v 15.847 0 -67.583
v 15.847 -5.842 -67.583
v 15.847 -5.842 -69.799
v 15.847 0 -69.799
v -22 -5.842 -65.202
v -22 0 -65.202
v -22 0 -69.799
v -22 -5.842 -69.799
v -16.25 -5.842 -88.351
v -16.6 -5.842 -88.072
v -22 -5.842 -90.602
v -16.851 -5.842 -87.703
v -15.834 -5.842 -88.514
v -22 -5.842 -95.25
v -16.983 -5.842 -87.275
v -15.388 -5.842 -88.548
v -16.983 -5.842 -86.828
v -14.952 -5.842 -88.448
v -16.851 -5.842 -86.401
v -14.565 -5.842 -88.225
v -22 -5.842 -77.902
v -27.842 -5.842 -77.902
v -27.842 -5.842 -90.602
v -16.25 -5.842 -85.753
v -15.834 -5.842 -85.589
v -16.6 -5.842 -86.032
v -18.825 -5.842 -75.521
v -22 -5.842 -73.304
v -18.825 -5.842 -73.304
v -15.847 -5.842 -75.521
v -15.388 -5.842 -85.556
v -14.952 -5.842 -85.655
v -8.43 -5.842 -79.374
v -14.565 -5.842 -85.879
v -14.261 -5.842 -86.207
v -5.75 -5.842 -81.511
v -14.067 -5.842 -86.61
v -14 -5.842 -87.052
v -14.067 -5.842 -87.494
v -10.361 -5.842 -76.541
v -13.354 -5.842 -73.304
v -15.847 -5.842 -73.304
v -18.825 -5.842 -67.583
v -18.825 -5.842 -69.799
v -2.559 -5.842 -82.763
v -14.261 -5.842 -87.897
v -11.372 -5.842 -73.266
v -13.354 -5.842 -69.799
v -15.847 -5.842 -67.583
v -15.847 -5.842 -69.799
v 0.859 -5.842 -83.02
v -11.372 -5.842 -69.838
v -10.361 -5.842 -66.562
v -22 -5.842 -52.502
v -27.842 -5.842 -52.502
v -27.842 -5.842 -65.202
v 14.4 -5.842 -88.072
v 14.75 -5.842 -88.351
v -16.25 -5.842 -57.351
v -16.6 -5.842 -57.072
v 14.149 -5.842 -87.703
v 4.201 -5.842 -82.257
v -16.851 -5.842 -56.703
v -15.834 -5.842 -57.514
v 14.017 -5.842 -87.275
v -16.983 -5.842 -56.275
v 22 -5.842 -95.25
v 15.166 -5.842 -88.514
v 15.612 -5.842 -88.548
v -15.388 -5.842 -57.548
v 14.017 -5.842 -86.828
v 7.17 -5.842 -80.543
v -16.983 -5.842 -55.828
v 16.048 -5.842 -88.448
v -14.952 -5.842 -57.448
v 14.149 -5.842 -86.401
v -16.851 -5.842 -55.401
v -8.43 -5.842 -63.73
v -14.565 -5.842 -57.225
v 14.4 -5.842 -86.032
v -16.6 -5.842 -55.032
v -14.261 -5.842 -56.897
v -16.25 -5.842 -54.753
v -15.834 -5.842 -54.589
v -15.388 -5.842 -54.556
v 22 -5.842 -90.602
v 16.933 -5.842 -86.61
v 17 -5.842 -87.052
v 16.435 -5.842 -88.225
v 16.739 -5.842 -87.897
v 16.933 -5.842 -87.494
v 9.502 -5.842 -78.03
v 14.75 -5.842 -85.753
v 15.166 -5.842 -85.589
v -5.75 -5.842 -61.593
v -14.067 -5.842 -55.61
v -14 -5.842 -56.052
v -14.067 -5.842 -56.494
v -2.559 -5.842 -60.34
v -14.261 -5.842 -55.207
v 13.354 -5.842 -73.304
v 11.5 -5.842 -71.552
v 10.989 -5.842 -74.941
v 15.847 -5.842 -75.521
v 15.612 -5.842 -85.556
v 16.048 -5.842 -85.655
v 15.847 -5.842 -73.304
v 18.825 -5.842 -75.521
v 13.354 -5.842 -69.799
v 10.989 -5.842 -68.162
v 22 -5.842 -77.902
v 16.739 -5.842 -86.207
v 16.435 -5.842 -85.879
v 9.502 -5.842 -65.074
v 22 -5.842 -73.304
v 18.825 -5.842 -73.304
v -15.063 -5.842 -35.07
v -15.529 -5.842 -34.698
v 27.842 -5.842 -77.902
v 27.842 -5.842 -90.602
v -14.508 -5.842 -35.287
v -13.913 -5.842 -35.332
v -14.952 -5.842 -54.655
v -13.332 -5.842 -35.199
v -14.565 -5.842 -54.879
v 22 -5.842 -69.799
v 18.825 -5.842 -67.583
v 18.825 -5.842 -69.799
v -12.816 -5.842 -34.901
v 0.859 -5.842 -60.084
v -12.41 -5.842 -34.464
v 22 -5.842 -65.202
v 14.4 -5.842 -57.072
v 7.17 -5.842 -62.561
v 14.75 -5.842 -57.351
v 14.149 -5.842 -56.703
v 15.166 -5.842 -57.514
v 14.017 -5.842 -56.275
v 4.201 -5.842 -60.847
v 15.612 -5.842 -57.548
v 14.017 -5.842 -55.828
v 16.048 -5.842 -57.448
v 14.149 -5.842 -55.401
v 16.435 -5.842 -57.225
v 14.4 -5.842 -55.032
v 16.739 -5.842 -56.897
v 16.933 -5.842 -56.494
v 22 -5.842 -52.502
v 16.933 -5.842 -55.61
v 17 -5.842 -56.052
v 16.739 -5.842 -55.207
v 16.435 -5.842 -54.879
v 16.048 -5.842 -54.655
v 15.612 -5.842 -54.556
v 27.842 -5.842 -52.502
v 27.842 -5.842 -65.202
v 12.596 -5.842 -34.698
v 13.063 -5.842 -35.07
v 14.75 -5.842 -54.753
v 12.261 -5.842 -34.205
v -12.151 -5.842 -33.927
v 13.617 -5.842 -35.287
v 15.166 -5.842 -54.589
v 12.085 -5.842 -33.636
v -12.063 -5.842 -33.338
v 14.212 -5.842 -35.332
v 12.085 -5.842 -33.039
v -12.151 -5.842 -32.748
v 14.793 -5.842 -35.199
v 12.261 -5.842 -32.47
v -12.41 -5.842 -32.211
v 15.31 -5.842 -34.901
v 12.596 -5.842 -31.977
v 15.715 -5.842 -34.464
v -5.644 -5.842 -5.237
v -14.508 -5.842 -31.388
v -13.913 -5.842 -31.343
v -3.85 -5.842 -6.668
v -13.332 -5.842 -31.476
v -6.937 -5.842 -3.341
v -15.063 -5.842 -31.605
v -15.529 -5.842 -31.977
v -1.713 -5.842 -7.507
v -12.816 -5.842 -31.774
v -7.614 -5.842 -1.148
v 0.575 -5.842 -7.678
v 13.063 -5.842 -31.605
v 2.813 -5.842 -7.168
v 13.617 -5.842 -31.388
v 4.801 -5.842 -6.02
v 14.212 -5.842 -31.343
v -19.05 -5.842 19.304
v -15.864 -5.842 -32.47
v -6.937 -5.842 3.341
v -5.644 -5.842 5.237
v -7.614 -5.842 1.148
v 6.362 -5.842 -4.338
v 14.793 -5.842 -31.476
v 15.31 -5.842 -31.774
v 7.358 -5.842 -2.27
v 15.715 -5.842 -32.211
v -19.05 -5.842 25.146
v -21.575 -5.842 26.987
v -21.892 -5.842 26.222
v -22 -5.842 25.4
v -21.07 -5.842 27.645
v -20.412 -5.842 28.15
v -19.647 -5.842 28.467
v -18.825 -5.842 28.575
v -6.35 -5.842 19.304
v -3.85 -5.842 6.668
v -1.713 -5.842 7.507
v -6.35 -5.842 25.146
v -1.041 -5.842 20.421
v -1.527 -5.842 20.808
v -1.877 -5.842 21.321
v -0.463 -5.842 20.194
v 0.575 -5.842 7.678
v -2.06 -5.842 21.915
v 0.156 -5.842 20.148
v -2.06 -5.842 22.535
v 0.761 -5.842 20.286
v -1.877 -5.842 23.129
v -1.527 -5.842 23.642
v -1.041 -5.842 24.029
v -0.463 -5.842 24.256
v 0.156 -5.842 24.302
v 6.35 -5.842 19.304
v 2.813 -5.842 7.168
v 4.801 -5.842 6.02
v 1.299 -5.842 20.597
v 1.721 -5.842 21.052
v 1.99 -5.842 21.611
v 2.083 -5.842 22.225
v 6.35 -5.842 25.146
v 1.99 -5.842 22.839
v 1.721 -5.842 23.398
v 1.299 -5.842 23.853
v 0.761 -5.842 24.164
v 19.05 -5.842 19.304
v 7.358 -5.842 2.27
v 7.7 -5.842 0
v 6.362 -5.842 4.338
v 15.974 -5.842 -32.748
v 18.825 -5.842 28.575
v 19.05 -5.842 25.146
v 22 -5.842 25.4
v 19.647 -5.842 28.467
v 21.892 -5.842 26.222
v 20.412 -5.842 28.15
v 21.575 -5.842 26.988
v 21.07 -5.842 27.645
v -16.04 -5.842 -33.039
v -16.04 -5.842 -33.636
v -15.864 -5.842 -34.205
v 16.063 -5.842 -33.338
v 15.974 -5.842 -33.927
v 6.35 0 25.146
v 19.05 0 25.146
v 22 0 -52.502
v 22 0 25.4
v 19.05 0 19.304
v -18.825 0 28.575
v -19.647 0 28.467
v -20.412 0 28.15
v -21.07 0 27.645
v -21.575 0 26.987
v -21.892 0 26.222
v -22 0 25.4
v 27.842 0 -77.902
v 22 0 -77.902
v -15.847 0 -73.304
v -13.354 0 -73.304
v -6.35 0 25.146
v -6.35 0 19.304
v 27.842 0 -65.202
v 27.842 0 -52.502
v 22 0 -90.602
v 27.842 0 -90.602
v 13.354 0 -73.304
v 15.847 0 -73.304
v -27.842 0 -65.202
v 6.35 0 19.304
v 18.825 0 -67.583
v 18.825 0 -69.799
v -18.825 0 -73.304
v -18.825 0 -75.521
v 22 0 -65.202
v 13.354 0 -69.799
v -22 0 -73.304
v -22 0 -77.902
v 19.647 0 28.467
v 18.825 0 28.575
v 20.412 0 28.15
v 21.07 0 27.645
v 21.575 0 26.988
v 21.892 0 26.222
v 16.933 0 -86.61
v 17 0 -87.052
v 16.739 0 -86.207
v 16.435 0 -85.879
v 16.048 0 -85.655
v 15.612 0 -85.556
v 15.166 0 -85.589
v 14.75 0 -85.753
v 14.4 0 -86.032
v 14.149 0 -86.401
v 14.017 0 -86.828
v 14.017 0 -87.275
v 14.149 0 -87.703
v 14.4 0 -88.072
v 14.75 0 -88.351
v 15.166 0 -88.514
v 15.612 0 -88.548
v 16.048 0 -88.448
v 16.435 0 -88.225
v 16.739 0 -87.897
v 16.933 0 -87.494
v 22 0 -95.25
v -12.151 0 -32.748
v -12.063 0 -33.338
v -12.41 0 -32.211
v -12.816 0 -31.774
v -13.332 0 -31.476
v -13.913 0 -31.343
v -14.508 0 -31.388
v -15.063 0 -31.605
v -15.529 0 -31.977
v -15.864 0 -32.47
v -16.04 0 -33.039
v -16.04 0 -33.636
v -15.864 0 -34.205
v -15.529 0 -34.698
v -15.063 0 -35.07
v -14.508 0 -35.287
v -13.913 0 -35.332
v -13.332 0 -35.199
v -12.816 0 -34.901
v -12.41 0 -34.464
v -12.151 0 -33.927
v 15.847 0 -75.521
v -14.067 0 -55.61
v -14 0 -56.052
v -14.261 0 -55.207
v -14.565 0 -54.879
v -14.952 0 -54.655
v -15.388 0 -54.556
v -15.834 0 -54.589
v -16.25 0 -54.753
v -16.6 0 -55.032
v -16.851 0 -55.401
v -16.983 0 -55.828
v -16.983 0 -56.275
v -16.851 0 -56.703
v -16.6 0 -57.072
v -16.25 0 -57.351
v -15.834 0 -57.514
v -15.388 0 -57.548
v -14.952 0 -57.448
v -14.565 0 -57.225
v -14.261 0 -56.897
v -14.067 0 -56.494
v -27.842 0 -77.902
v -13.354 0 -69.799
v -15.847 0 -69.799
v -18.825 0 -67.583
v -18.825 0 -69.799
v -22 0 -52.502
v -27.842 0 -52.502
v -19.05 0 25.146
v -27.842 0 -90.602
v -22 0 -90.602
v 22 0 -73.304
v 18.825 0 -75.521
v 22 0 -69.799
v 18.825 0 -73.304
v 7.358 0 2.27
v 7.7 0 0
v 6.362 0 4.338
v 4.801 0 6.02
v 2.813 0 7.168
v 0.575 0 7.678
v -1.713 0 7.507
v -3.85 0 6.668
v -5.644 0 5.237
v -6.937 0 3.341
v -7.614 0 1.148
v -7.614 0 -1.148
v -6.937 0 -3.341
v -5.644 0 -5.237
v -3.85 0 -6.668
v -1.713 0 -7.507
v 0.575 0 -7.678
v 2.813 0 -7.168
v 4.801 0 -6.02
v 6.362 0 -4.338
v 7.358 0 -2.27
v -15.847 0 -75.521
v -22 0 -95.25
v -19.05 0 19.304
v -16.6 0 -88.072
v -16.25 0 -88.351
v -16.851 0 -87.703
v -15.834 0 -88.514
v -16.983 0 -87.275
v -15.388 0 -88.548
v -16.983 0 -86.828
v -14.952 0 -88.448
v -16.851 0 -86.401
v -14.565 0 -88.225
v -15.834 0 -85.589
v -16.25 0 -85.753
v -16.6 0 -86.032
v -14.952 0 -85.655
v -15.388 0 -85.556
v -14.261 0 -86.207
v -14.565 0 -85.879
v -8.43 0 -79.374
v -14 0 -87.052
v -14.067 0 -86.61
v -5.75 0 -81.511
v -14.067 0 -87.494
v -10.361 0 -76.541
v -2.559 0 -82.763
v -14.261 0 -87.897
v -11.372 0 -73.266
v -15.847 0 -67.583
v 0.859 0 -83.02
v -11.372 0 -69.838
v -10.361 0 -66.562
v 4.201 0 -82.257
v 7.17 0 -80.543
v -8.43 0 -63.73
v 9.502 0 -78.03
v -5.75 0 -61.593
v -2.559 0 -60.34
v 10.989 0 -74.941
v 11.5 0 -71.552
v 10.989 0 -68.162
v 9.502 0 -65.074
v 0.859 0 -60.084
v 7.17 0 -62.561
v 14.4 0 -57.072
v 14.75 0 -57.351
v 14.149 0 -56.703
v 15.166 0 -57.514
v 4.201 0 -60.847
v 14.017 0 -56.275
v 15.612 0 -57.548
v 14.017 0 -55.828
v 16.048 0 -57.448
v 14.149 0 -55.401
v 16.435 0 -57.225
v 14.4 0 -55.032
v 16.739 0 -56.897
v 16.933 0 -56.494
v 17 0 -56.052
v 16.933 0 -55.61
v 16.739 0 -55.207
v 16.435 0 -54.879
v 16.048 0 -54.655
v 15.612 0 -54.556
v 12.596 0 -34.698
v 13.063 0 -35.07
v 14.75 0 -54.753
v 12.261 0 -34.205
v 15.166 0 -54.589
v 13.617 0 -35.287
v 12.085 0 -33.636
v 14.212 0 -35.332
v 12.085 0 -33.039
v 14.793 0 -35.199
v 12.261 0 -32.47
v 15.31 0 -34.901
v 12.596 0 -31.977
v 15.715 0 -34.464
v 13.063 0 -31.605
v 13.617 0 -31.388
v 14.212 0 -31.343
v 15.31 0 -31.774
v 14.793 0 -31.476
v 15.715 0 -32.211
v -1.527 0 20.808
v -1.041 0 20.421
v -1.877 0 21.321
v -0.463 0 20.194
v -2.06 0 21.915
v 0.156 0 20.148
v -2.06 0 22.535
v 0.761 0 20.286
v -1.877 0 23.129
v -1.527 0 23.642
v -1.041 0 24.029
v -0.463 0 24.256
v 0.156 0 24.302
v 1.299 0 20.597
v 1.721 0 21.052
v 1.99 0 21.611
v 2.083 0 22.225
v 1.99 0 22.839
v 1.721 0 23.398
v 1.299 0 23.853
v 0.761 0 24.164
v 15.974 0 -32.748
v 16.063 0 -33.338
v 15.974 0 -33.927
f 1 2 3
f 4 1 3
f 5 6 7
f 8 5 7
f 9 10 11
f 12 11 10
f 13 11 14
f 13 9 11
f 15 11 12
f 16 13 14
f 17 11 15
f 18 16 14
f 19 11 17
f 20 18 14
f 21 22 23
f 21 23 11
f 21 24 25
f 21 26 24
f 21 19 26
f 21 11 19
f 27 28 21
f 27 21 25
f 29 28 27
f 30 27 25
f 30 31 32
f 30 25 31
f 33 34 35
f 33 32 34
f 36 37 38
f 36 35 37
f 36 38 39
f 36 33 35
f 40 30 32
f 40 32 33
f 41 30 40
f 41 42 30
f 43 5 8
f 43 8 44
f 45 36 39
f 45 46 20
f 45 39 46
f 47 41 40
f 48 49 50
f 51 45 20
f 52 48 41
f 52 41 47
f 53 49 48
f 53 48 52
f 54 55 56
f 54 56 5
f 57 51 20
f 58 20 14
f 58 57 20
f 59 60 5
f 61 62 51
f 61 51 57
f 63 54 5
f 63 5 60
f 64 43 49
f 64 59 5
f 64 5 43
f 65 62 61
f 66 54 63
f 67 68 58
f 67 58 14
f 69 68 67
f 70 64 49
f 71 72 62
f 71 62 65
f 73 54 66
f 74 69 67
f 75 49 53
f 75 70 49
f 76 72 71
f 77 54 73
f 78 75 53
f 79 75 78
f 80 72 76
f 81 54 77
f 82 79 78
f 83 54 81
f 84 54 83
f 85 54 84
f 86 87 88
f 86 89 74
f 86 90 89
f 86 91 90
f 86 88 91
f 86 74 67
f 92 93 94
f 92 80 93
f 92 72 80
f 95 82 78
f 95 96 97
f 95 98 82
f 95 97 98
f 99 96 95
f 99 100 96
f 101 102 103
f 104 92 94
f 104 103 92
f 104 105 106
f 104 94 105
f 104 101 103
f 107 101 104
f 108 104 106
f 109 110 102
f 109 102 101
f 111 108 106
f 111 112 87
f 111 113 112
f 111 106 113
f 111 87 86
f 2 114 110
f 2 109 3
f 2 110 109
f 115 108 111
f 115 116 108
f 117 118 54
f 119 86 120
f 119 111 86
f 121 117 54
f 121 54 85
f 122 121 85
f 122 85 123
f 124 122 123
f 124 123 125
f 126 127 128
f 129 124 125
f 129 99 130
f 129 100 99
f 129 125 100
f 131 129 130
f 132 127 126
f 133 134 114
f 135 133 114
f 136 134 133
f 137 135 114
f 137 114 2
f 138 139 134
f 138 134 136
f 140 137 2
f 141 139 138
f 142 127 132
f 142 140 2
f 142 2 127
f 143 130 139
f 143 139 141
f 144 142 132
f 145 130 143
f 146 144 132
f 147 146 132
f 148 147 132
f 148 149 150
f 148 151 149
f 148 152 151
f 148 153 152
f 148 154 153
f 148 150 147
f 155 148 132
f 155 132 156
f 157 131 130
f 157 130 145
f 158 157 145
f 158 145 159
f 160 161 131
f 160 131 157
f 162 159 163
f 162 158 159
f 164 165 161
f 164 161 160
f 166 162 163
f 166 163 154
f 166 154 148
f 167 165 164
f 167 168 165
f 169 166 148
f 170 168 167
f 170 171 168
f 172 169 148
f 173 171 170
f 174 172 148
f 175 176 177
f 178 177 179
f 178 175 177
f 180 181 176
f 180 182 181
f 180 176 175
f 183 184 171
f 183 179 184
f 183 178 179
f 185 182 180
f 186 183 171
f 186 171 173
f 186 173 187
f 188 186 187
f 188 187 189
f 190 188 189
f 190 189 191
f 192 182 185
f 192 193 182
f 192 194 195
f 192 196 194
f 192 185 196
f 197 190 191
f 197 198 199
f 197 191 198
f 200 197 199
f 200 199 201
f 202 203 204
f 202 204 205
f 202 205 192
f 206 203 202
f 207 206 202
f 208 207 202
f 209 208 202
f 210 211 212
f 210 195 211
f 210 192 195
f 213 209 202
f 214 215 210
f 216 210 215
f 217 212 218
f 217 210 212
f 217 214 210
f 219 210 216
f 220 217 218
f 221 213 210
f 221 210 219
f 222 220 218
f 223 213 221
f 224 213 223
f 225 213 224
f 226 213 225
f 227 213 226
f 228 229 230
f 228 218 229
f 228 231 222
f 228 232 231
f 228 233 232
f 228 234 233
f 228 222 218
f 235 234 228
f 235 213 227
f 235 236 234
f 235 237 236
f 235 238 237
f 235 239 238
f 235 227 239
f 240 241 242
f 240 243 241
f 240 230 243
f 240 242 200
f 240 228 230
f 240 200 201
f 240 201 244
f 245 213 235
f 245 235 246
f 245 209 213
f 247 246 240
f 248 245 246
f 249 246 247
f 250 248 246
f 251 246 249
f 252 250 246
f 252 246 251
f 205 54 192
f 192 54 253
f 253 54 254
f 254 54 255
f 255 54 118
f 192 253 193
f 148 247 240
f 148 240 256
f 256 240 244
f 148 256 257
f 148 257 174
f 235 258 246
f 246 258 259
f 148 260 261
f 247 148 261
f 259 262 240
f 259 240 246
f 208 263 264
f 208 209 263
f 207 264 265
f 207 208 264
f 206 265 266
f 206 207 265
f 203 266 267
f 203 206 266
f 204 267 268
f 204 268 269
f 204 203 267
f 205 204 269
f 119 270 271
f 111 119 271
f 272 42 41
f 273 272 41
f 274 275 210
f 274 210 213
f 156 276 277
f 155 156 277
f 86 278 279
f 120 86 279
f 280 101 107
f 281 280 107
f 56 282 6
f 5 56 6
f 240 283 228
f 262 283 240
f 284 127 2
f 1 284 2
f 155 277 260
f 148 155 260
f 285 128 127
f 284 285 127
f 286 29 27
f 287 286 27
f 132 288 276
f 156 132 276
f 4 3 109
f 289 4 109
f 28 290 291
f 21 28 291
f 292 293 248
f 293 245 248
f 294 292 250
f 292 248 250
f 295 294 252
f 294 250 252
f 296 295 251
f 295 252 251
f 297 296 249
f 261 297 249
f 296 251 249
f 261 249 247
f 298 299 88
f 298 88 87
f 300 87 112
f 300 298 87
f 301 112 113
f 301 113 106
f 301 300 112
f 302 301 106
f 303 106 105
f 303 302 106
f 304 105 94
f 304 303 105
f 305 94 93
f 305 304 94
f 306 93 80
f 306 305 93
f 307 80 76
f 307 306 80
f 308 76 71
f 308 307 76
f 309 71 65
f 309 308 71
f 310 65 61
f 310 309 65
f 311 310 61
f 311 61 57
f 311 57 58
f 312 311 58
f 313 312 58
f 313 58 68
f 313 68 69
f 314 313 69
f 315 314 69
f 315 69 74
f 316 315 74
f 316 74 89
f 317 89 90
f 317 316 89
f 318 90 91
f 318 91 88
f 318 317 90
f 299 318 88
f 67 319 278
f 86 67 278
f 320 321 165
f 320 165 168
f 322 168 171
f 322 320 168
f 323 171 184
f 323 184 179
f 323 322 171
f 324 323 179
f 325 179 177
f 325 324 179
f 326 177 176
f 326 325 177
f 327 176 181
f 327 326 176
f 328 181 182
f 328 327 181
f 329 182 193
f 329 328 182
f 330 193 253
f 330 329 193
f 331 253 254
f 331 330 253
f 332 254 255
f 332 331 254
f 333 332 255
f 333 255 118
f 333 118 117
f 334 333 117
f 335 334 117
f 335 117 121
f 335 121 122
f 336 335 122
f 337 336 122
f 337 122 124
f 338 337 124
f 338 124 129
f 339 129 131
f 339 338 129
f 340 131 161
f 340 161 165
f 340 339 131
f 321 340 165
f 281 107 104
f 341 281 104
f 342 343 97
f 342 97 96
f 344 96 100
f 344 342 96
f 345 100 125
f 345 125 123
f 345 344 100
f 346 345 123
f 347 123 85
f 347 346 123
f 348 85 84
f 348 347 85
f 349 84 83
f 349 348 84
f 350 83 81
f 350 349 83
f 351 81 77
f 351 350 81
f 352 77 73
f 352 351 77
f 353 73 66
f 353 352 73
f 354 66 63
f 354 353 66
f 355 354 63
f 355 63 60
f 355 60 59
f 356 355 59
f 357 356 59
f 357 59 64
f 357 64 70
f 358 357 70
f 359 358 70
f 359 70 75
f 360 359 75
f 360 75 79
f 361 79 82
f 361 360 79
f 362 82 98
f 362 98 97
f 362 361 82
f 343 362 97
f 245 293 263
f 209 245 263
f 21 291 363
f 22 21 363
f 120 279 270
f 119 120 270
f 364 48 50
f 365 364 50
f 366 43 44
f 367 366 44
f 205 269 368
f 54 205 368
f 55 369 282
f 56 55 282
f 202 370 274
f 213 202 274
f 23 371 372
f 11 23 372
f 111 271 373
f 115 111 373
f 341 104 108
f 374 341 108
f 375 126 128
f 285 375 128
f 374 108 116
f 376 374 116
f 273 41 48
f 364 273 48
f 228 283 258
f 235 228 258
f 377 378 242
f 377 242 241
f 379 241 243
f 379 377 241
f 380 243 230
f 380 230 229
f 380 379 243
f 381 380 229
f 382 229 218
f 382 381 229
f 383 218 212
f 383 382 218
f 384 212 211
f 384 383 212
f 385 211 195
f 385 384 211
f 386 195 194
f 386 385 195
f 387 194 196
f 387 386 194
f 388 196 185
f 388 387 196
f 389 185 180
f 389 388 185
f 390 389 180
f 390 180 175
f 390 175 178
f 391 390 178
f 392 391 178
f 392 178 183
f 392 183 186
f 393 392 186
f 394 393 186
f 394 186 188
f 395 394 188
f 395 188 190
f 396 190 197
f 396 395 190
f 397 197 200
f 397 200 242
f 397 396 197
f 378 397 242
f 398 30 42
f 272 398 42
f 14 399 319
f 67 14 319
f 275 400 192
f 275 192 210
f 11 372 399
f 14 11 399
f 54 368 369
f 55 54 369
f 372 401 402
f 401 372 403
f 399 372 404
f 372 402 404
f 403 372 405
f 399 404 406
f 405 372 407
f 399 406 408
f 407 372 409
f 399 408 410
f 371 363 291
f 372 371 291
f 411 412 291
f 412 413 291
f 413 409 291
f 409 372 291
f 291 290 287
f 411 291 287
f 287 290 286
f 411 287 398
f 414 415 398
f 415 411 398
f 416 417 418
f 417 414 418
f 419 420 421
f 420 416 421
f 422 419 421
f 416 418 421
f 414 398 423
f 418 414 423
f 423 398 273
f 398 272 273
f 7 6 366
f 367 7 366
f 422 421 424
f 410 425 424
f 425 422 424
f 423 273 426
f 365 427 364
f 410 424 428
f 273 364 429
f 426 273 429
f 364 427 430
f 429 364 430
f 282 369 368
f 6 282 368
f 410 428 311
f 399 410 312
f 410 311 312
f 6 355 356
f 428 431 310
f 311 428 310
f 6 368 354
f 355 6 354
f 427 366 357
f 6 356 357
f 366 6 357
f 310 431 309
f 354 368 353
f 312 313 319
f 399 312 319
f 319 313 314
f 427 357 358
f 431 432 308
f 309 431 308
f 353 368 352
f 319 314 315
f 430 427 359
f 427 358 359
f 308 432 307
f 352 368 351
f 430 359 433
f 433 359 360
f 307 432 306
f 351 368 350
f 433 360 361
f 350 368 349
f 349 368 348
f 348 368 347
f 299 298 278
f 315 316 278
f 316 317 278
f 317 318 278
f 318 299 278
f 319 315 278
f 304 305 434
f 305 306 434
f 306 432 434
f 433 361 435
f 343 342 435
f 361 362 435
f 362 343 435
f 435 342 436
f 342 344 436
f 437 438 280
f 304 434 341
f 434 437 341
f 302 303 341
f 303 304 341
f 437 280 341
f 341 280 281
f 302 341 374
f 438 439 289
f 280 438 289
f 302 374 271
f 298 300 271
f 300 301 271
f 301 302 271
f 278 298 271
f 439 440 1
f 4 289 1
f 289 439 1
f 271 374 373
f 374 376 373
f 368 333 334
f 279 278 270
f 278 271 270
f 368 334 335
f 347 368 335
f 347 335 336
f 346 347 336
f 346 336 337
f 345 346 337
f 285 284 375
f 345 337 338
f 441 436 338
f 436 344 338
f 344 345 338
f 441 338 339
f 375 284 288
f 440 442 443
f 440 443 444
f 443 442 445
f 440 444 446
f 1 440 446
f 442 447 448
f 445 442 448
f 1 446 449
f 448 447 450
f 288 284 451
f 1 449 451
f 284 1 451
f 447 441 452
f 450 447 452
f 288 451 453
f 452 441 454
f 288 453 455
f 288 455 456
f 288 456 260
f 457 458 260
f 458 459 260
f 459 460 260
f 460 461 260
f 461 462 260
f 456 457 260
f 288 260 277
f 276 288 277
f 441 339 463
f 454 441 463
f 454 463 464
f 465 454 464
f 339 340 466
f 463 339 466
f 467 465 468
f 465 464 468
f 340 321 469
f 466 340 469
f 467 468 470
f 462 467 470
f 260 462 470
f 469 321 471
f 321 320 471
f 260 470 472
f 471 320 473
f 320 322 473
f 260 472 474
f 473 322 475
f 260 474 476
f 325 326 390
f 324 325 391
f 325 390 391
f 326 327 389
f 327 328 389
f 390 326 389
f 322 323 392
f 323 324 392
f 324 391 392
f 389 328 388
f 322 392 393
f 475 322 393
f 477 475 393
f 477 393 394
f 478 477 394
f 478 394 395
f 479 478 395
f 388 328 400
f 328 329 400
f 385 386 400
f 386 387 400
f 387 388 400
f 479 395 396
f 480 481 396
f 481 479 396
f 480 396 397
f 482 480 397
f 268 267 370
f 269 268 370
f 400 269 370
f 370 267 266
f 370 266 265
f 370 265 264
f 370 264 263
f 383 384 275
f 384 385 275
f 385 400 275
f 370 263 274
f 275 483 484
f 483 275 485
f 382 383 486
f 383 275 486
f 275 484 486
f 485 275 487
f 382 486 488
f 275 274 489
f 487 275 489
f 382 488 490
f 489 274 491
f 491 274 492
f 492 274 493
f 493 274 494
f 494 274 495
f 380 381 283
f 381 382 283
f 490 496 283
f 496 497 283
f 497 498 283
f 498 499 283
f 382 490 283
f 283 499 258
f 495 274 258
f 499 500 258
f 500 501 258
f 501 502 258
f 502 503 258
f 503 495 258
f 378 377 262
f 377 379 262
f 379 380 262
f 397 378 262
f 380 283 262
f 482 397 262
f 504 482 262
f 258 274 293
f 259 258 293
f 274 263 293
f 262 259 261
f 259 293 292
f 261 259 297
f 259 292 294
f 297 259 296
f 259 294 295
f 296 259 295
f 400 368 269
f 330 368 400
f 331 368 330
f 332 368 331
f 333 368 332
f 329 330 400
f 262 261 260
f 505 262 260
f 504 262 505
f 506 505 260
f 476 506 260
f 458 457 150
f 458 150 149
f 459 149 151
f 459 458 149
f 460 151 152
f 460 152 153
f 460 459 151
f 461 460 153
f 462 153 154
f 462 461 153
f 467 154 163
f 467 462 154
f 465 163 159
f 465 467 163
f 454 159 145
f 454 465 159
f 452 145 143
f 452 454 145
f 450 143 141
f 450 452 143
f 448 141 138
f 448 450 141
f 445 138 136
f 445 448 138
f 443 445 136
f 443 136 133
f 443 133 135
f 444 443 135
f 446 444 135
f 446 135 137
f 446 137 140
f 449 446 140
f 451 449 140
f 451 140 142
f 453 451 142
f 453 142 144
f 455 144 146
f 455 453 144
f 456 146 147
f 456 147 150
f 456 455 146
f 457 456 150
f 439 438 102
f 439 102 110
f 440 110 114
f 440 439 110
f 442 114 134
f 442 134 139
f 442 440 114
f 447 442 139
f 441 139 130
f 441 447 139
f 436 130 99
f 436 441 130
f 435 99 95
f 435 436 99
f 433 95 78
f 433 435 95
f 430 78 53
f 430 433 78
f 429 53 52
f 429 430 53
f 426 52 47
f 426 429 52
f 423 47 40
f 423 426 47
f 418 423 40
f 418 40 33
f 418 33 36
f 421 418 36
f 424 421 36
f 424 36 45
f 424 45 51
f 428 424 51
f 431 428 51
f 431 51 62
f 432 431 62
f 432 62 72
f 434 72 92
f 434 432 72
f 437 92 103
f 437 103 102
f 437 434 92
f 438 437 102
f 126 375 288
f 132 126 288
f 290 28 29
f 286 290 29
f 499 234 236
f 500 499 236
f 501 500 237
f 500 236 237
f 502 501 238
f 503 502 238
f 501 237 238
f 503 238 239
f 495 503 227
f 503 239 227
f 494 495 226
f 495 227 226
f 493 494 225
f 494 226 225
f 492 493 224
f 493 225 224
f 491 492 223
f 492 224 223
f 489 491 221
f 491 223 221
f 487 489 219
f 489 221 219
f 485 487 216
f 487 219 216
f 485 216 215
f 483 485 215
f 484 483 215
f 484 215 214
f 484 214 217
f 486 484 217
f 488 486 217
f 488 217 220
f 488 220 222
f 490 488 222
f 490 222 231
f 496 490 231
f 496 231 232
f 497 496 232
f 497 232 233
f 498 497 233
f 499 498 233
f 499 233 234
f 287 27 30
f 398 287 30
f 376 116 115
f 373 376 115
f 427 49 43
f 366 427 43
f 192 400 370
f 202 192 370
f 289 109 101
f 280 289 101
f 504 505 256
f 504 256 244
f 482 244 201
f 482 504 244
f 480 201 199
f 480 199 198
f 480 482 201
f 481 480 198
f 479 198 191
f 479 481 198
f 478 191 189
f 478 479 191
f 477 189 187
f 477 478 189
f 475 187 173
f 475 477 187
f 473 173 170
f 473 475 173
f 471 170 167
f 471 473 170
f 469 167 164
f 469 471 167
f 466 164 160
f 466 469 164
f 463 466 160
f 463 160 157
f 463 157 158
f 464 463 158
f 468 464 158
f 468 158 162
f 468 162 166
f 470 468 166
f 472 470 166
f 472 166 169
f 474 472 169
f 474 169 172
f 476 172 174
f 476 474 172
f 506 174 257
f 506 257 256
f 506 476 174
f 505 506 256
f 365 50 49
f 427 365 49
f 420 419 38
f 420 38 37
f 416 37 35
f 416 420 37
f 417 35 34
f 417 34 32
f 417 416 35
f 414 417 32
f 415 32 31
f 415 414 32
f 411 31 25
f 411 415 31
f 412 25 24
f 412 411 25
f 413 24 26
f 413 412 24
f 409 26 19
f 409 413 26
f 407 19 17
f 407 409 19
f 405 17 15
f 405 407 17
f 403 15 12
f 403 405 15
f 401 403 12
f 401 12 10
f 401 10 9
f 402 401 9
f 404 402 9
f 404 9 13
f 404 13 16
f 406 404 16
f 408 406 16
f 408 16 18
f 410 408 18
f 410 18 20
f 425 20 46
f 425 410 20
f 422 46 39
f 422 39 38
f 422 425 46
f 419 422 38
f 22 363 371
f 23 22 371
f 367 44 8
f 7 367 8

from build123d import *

# Parameters (mm, degrees)
F0_R     = 1.5
F0_R_2   = 11.5
F0_R_3   = 2
F0_W     = 12.7
F0_H     = 5.842
F0_R_4   = 7.7
F1_DEPTH = 5.842
F2_R     = 3.175
F4_DEPTH = 5.843
F5_R     = 2.0828
F6_DEPTH = 25.4


with BuildPart() as f1:
    # F0 (on Front) → F1 (new body)
    with BuildSketch(Plane.XZ):
        Polygon((22, 28.575), (-22, 28.575), (-22, -52.5018), (-27.842, -52.5018), (-27.842, -65.2018), (-22, -65.2018), (-22, -77.9018), (-27.842, -77.9018), (-27.842, -90.6018), (-22, -90.6018), (-22, -95.25), (22, -95.25), (22, -90.6018), (27.842, -90.6018), (27.842, -77.9018), (22, -77.9018), (22, -65.2018), (27.842, -65.2018), (27.842, -52.5018), (22, -52.5018), align=None)
        with Locations((-15.5, -87.0518)):
            Circle(F0_R, mode=Mode.SUBTRACT)
        with Locations((-15.5, -56.0518)):
            Circle(F0_R, mode=Mode.SUBTRACT)
        with Locations((0, -71.5518)):
            Circle(F0_R_2, mode=Mode.SUBTRACT)
        with Locations((15.5, -87.0518)):
            Circle(F0_R, mode=Mode.SUBTRACT)
        with Locations((15.5, -56.0518)):
            Circle(F0_R, mode=Mode.SUBTRACT)
        with Locations((-14.062533, -33.3375)):
            Circle(F0_R_3, mode=Mode.SUBTRACT)
        with Locations((-12.7, 22.225)):
            Rectangle(F0_W, F0_H, mode=Mode.SUBTRACT)
        with Locations((14.062533, -33.3375)):
            Circle(F0_R_3, mode=Mode.SUBTRACT)
        Circle(F0_R_4, mode=Mode.SUBTRACT)
        with Locations((12.7, 22.225)):
            Rectangle(F0_W, F0_H, mode=Mode.SUBTRACT)
    extrude(amount=F1_DEPTH)

    # F2
    f2_edges = [f1.edges().sort_by_distance(p)[0] for p in [
        (-22, -2.921, 28.575),
        (22, -2.921, 28.575),
    ]]
    fillet(f2_edges, radius=F2_R)

    # F3 (on face) → F4 (cut, through all)
    with BuildSketch(Plane.XZ.offset(5.842)):
        Polygon((-18.825, -69.7992), (-22, -69.7992), (-22, -73.3044), (-18.825, -73.3044), (-18.825, -75.52055), (-15.846875, -75.52055), (-15.846875, -73.3044), (-13.3545, -73.3044), (-13.3545, -69.7992), (-15.846875, -69.7992), (-15.846875, -67.58305), (-18.825, -67.58305), align=None)
        Polygon((22, -73.3044), (22, -69.7992), (18.825, -69.7992), (18.825, -67.58305), (15.846875, -67.58305), (15.846875, -69.7992), (13.3545, -69.7992), (13.3545, -73.3044), (15.846875, -73.3044), (15.846875, -75.52055), (18.825, -75.52055), (18.825, -73.3044), align=None)
    extrude(amount=-F4_DEPTH, mode=Mode.SUBTRACT)

    # F5 (on face) → F6 (cut)
    with BuildSketch(Plane.XZ.offset(5.842)):
        with Locations((0, 22.225)):
            Circle(F5_R)
    extrude(amount=-F6_DEPTH, mode=Mode.SUBTRACT)


solid = f1.part
